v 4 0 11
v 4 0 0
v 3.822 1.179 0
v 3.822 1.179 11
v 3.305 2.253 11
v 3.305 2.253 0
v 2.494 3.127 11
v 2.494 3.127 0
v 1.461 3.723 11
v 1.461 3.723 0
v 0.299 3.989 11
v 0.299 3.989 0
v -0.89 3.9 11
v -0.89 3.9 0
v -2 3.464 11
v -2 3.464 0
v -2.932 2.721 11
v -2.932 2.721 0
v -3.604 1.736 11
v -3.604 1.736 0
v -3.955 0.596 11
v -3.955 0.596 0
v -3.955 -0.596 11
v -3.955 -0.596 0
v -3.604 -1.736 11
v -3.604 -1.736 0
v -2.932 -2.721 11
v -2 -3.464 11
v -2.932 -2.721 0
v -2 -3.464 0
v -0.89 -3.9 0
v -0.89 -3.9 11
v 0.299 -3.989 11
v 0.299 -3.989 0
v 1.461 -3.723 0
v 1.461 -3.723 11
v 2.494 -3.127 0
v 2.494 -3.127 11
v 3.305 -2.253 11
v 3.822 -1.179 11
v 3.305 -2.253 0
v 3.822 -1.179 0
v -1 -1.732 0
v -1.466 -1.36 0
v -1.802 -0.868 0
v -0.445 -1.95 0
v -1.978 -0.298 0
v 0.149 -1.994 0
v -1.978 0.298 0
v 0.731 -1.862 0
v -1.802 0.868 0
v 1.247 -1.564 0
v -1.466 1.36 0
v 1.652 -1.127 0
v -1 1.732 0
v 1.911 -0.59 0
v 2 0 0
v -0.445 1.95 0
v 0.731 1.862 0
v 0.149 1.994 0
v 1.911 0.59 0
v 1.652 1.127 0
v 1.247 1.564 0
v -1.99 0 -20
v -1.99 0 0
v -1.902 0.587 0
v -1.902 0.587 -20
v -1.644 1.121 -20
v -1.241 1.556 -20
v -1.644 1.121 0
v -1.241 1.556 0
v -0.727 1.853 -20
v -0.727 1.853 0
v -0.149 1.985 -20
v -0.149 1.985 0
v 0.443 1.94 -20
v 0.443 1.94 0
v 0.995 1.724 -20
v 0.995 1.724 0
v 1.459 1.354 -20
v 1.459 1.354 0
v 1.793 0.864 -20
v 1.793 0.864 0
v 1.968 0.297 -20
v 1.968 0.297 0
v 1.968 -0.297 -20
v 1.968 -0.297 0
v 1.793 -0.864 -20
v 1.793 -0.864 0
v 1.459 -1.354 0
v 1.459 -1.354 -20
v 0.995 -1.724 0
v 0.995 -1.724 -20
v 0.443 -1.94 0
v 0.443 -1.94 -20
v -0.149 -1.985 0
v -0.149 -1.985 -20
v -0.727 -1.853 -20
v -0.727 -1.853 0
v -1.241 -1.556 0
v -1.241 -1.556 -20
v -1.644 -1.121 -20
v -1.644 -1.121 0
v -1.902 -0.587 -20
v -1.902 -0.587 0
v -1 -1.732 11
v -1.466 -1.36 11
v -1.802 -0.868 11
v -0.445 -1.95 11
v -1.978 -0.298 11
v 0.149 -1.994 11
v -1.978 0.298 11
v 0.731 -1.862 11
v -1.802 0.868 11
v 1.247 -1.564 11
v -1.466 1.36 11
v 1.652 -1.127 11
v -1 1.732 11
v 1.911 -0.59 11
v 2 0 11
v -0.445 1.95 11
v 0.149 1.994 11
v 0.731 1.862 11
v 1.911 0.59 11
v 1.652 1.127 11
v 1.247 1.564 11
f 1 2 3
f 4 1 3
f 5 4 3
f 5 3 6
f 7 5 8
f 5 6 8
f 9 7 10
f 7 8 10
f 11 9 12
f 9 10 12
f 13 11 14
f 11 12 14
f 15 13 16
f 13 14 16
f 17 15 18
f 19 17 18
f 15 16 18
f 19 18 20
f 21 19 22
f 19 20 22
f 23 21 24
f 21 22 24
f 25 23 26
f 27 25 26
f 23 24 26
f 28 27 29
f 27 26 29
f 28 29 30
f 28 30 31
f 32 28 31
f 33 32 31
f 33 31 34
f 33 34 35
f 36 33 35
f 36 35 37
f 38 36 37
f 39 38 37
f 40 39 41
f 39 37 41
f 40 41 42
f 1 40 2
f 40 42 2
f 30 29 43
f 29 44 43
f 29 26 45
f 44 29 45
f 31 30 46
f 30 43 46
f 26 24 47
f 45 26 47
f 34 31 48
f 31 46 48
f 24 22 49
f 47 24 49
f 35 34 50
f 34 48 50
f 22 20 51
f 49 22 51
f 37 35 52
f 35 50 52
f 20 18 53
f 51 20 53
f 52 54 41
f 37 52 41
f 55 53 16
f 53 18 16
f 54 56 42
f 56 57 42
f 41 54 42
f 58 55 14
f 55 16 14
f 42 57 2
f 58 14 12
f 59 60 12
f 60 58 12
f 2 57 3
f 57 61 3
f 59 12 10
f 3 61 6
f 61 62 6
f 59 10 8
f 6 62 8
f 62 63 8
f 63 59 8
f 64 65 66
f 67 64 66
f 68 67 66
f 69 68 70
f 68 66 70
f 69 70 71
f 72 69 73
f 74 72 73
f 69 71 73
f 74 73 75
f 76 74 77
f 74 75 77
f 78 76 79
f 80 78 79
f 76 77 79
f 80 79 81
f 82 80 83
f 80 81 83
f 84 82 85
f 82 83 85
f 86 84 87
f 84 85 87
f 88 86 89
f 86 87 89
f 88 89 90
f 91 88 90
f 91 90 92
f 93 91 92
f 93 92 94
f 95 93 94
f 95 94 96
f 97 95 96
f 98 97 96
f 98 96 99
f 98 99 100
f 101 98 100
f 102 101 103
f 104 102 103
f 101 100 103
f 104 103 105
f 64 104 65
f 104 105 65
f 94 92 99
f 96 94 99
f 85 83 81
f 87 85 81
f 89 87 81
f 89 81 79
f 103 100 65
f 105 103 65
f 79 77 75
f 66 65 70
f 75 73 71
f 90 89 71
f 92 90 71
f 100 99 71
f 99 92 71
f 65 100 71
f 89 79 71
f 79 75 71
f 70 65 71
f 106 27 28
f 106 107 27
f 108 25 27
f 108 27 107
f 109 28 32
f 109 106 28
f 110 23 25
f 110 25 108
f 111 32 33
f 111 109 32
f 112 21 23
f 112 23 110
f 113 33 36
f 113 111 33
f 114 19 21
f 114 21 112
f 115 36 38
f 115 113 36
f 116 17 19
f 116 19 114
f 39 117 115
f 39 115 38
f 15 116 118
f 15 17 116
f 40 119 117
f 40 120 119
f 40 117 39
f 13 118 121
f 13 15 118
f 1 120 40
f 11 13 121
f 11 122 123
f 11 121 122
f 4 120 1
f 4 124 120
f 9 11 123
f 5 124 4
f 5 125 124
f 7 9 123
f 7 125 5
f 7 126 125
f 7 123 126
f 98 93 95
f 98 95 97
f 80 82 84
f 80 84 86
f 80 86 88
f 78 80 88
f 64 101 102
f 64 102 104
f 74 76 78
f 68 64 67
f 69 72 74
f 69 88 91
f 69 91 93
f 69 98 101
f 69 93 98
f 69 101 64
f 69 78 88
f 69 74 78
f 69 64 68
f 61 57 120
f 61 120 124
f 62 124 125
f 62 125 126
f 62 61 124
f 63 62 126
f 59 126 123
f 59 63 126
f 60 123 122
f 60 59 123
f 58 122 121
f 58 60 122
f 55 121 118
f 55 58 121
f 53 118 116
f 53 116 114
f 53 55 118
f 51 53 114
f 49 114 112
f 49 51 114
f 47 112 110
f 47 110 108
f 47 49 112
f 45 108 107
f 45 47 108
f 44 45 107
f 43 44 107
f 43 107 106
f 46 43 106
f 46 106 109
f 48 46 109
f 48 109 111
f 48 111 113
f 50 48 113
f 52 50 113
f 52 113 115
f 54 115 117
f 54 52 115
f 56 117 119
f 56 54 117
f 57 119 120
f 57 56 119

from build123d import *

# Parameters (mm, degrees)
SKETCH1_R           = 4
SKETCH1_R_2         = 2
BOSS_EXTRUDE1_DEPTH = 11
SKETCH2_R           = 1.990334505
BOSS_EXTRUDE2_DEPTH = 20


with BuildPart() as part:
    # Sketch1 → Boss-Extrude1 (new body)
    with BuildSketch(Plane.XY):
        Circle(SKETCH1_R)
        Circle(SKETCH1_R_2, mode=Mode.SUBTRACT)
    extrude(amount=BOSS_EXTRUDE1_DEPTH)


with BuildPart() as body_2:
    # Sketch2 → Boss-Extrude2 (new body)
    with BuildSketch(Plane(origin=(0, 0, 0), x_dir=(-1, 0, 0), z_dir=(0, 0, -1))):
        Circle(SKETCH2_R)
    extrude(amount=BOSS_EXTRUDE2_DEPTH)


solid = Compound([part.part, body_2.part])
